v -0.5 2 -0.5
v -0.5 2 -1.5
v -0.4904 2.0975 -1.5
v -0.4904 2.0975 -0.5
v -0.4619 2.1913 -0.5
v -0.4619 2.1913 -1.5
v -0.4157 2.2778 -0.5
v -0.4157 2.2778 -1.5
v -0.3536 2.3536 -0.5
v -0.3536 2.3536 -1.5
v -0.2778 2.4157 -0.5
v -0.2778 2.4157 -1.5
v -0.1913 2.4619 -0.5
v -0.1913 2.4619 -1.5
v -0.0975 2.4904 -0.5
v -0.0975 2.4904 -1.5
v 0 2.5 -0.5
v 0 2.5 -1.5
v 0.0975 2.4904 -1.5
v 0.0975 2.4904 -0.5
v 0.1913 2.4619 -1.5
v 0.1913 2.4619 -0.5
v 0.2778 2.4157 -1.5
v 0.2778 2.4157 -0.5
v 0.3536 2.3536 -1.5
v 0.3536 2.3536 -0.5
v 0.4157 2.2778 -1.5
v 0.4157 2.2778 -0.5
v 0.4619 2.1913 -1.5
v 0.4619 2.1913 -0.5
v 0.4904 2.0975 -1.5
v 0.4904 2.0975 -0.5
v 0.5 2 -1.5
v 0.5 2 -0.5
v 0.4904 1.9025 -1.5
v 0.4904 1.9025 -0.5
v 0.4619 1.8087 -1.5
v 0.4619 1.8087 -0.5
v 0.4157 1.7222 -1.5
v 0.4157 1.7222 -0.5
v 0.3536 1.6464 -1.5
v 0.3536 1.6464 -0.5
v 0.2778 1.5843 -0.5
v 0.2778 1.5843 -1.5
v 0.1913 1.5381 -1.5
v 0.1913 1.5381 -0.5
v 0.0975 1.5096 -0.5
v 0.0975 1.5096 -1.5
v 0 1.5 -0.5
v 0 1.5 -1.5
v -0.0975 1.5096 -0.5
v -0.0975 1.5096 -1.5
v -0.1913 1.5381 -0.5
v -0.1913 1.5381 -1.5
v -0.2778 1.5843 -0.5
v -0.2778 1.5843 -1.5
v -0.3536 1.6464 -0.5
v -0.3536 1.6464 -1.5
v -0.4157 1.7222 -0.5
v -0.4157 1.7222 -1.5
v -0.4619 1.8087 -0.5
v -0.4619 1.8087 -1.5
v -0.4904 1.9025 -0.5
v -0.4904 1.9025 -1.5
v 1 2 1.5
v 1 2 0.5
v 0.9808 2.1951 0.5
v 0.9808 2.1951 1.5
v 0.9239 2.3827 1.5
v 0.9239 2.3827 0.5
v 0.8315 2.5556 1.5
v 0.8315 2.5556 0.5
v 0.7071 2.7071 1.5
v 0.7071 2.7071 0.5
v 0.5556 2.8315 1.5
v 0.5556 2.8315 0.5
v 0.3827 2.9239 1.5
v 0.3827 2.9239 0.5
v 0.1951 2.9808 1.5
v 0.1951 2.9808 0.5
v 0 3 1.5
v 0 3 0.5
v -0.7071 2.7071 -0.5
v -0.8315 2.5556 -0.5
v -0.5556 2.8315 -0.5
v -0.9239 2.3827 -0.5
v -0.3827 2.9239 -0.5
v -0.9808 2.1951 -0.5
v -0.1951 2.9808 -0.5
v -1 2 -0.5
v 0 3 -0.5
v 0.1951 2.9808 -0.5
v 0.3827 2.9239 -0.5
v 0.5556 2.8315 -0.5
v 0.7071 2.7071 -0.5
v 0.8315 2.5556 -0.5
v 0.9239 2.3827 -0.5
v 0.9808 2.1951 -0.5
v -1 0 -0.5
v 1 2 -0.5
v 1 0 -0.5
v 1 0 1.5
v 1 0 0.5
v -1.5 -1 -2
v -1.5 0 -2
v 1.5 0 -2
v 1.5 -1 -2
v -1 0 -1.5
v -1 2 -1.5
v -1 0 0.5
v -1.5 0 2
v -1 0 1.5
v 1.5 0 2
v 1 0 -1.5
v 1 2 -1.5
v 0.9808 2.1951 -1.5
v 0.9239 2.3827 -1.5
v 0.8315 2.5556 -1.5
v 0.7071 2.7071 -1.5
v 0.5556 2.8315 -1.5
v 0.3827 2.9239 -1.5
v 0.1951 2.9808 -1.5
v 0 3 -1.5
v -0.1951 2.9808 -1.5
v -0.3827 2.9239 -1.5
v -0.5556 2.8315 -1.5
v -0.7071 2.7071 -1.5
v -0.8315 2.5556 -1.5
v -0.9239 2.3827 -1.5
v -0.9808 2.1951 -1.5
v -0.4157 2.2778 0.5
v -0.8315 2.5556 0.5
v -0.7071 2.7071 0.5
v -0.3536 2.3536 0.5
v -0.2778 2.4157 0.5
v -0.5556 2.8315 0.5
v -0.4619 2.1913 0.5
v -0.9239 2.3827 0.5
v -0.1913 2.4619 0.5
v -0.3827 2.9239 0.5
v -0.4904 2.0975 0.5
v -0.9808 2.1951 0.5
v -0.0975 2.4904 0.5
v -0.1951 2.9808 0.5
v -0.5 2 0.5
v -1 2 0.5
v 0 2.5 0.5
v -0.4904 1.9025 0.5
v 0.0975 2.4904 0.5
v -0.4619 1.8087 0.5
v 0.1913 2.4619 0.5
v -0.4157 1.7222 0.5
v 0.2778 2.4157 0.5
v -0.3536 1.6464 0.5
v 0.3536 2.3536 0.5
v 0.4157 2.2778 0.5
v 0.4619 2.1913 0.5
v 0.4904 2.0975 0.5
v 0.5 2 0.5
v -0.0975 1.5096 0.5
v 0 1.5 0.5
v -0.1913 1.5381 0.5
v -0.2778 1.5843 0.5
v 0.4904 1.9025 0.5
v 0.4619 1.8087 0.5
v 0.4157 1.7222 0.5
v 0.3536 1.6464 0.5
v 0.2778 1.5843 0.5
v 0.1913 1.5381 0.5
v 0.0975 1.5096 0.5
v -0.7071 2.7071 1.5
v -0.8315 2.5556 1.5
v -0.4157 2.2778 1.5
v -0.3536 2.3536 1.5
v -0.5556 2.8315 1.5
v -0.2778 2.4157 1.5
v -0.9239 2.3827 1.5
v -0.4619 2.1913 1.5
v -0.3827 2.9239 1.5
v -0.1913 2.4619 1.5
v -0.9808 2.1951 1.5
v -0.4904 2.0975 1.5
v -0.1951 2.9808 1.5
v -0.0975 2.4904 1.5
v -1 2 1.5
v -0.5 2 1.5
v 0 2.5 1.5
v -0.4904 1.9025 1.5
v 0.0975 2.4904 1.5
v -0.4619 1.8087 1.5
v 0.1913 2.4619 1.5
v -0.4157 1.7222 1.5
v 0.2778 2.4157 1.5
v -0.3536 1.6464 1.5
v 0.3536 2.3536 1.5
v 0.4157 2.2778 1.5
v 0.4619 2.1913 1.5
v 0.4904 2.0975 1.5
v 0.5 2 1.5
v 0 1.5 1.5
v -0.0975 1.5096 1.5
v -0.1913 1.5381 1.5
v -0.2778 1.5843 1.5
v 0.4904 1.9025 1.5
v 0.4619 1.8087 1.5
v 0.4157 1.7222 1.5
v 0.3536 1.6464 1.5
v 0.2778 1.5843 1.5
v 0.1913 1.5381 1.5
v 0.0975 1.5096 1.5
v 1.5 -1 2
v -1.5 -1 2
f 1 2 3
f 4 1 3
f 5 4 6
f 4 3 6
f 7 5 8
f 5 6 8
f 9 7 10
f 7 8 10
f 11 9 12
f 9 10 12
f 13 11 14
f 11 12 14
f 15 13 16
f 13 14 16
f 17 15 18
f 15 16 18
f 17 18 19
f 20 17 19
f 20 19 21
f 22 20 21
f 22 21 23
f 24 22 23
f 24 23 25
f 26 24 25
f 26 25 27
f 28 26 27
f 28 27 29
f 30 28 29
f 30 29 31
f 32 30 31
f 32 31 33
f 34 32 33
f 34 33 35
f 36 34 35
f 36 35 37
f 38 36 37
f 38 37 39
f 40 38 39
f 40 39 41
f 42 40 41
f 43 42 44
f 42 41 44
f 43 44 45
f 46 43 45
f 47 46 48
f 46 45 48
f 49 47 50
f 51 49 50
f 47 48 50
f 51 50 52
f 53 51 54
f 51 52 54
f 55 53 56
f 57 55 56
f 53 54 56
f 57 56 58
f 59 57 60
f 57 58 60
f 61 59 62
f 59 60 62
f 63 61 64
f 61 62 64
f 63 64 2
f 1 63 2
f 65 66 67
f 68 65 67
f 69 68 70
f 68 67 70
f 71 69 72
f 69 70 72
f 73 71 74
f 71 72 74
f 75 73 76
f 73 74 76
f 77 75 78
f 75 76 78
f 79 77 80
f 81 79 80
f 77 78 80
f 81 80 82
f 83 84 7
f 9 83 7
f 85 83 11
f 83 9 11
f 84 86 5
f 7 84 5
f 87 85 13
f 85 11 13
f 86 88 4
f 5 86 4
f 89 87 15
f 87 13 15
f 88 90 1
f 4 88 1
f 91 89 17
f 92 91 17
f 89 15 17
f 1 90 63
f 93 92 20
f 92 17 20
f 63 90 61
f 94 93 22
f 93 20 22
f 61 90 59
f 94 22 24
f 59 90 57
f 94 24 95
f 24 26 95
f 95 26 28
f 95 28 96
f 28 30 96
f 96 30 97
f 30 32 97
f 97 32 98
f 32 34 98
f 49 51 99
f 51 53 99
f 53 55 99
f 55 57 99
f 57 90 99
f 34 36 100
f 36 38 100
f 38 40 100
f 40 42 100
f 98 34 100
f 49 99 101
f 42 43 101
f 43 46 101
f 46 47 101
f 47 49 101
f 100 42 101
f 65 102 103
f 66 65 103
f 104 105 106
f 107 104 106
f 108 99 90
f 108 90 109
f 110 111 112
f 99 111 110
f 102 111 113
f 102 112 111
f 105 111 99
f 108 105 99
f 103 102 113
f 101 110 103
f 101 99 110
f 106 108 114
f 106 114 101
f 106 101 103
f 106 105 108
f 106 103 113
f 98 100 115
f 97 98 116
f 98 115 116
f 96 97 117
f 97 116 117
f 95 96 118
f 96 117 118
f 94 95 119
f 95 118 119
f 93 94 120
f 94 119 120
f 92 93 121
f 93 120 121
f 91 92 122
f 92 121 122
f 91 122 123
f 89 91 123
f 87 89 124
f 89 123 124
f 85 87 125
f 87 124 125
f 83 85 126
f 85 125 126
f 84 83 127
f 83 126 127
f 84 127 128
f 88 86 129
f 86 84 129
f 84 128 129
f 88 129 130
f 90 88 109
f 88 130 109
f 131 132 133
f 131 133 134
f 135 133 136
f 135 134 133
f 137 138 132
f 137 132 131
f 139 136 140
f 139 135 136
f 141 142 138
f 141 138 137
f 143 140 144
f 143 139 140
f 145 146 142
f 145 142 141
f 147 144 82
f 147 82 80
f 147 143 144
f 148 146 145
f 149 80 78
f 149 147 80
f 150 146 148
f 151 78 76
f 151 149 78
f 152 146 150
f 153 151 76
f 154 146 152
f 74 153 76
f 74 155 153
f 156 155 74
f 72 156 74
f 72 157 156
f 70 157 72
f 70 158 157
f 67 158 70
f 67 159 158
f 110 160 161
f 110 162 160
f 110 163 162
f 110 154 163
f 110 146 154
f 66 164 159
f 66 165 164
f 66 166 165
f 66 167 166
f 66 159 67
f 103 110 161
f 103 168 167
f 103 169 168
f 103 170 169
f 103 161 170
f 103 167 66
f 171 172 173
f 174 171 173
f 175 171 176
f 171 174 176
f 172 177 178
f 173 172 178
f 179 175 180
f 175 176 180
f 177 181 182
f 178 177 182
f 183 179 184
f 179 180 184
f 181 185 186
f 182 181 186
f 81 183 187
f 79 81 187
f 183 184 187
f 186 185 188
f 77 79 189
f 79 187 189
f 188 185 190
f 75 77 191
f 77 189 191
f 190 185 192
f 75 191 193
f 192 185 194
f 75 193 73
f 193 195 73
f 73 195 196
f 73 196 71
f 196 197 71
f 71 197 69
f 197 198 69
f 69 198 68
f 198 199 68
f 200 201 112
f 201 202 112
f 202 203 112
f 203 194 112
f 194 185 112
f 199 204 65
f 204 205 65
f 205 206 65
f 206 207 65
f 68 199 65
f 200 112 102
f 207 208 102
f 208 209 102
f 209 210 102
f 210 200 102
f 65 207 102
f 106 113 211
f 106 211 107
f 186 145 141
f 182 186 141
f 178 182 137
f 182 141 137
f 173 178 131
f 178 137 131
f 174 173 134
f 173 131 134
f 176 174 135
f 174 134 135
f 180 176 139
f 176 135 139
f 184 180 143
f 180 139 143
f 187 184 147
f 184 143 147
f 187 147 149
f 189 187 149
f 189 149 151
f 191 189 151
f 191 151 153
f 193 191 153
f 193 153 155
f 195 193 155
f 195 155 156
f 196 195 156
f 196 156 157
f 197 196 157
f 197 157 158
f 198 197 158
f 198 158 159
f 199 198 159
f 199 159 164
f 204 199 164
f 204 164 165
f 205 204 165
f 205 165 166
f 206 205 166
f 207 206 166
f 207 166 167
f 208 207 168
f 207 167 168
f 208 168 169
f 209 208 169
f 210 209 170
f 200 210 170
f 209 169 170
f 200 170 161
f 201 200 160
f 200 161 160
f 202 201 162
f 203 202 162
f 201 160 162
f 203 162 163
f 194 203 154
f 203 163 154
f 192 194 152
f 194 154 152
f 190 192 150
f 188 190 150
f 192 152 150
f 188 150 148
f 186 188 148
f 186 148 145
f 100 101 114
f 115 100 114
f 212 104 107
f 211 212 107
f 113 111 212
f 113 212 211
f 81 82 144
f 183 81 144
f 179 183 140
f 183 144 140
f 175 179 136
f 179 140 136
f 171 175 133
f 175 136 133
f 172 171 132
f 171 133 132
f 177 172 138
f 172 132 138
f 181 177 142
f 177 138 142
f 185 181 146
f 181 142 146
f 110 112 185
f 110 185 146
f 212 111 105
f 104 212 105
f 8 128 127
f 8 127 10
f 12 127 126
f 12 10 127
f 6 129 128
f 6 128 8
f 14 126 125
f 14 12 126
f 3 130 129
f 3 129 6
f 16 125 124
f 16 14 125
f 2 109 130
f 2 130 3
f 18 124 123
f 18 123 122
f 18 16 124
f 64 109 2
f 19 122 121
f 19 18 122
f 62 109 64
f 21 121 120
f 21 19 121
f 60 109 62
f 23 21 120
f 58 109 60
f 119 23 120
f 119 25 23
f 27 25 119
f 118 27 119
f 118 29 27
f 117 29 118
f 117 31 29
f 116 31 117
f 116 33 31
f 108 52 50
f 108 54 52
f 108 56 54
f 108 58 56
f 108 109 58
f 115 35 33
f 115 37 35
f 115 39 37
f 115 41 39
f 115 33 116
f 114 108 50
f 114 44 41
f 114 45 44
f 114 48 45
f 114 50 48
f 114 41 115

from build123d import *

# Parameters (mm, degrees)
SKETCH1_W           = 3
SKETCH1_H           = 4
BOSS_EXTRUDE1_DEPTH = 1
SKETCH1_3_W         = 2
SKETCH1_3_H         = 1
BOSS_EXTRUDE2_DEPTH = 3
SKETCH2_R           = 0.5
CUT_EXTRUDE1_DEPTH  = 3


with BuildPart() as part:
    # Sketch1 → Boss-Extrude1 (new body)
    with BuildSketch(Plane(origin=(0, 0, 0), x_dir=(1, 0, 0), z_dir=(0, 1, 0))):
        Rectangle(SKETCH1_W, SKETCH1_H)
    extrude(amount=-BOSS_EXTRUDE1_DEPTH)

    # Sketch1<3> → Boss-Extrude2 (add)
    with BuildSketch(Plane(origin=(0, 0, 0), x_dir=(1, 0, 0), z_dir=(0, 1, 0))):
        with Locations((0, 1)):
            Rectangle(SKETCH1_3_W, SKETCH1_3_H)
        with Locations((0, -1)):
            Rectangle(SKETCH1_3_W, SKETCH1_3_H)
    extrude(amount=BOSS_EXTRUDE2_DEPTH)

    # Sketch2 → Cut-Extrude1 (cut)
    with BuildSketch(Plane(origin=(0, 0, -1.5), x_dir=(-1, 0, 0), z_dir=(0, 0, -1))):
        with BuildLine():
            Line((-1, 3), (-1, 2))
            ThreePointArc((-1, 2), (-0.707106781, 2.707106781), (0, 3))
            Line((0, 3), (-1, 3))
        make_face()
        with BuildLine():
            ThreePointArc((0, 3), (0.707106781, 2.707106781), (1, 2))
            Line((1, 2), (1, 3))
            Line((1, 3), (0, 3))
        make_face()
        with Locations((0, 2)):
            Circle(SKETCH2_R)
    extrude(amount=-CUT_EXTRUDE1_DEPTH, mode=Mode.SUBTRACT)


solid = part.part
